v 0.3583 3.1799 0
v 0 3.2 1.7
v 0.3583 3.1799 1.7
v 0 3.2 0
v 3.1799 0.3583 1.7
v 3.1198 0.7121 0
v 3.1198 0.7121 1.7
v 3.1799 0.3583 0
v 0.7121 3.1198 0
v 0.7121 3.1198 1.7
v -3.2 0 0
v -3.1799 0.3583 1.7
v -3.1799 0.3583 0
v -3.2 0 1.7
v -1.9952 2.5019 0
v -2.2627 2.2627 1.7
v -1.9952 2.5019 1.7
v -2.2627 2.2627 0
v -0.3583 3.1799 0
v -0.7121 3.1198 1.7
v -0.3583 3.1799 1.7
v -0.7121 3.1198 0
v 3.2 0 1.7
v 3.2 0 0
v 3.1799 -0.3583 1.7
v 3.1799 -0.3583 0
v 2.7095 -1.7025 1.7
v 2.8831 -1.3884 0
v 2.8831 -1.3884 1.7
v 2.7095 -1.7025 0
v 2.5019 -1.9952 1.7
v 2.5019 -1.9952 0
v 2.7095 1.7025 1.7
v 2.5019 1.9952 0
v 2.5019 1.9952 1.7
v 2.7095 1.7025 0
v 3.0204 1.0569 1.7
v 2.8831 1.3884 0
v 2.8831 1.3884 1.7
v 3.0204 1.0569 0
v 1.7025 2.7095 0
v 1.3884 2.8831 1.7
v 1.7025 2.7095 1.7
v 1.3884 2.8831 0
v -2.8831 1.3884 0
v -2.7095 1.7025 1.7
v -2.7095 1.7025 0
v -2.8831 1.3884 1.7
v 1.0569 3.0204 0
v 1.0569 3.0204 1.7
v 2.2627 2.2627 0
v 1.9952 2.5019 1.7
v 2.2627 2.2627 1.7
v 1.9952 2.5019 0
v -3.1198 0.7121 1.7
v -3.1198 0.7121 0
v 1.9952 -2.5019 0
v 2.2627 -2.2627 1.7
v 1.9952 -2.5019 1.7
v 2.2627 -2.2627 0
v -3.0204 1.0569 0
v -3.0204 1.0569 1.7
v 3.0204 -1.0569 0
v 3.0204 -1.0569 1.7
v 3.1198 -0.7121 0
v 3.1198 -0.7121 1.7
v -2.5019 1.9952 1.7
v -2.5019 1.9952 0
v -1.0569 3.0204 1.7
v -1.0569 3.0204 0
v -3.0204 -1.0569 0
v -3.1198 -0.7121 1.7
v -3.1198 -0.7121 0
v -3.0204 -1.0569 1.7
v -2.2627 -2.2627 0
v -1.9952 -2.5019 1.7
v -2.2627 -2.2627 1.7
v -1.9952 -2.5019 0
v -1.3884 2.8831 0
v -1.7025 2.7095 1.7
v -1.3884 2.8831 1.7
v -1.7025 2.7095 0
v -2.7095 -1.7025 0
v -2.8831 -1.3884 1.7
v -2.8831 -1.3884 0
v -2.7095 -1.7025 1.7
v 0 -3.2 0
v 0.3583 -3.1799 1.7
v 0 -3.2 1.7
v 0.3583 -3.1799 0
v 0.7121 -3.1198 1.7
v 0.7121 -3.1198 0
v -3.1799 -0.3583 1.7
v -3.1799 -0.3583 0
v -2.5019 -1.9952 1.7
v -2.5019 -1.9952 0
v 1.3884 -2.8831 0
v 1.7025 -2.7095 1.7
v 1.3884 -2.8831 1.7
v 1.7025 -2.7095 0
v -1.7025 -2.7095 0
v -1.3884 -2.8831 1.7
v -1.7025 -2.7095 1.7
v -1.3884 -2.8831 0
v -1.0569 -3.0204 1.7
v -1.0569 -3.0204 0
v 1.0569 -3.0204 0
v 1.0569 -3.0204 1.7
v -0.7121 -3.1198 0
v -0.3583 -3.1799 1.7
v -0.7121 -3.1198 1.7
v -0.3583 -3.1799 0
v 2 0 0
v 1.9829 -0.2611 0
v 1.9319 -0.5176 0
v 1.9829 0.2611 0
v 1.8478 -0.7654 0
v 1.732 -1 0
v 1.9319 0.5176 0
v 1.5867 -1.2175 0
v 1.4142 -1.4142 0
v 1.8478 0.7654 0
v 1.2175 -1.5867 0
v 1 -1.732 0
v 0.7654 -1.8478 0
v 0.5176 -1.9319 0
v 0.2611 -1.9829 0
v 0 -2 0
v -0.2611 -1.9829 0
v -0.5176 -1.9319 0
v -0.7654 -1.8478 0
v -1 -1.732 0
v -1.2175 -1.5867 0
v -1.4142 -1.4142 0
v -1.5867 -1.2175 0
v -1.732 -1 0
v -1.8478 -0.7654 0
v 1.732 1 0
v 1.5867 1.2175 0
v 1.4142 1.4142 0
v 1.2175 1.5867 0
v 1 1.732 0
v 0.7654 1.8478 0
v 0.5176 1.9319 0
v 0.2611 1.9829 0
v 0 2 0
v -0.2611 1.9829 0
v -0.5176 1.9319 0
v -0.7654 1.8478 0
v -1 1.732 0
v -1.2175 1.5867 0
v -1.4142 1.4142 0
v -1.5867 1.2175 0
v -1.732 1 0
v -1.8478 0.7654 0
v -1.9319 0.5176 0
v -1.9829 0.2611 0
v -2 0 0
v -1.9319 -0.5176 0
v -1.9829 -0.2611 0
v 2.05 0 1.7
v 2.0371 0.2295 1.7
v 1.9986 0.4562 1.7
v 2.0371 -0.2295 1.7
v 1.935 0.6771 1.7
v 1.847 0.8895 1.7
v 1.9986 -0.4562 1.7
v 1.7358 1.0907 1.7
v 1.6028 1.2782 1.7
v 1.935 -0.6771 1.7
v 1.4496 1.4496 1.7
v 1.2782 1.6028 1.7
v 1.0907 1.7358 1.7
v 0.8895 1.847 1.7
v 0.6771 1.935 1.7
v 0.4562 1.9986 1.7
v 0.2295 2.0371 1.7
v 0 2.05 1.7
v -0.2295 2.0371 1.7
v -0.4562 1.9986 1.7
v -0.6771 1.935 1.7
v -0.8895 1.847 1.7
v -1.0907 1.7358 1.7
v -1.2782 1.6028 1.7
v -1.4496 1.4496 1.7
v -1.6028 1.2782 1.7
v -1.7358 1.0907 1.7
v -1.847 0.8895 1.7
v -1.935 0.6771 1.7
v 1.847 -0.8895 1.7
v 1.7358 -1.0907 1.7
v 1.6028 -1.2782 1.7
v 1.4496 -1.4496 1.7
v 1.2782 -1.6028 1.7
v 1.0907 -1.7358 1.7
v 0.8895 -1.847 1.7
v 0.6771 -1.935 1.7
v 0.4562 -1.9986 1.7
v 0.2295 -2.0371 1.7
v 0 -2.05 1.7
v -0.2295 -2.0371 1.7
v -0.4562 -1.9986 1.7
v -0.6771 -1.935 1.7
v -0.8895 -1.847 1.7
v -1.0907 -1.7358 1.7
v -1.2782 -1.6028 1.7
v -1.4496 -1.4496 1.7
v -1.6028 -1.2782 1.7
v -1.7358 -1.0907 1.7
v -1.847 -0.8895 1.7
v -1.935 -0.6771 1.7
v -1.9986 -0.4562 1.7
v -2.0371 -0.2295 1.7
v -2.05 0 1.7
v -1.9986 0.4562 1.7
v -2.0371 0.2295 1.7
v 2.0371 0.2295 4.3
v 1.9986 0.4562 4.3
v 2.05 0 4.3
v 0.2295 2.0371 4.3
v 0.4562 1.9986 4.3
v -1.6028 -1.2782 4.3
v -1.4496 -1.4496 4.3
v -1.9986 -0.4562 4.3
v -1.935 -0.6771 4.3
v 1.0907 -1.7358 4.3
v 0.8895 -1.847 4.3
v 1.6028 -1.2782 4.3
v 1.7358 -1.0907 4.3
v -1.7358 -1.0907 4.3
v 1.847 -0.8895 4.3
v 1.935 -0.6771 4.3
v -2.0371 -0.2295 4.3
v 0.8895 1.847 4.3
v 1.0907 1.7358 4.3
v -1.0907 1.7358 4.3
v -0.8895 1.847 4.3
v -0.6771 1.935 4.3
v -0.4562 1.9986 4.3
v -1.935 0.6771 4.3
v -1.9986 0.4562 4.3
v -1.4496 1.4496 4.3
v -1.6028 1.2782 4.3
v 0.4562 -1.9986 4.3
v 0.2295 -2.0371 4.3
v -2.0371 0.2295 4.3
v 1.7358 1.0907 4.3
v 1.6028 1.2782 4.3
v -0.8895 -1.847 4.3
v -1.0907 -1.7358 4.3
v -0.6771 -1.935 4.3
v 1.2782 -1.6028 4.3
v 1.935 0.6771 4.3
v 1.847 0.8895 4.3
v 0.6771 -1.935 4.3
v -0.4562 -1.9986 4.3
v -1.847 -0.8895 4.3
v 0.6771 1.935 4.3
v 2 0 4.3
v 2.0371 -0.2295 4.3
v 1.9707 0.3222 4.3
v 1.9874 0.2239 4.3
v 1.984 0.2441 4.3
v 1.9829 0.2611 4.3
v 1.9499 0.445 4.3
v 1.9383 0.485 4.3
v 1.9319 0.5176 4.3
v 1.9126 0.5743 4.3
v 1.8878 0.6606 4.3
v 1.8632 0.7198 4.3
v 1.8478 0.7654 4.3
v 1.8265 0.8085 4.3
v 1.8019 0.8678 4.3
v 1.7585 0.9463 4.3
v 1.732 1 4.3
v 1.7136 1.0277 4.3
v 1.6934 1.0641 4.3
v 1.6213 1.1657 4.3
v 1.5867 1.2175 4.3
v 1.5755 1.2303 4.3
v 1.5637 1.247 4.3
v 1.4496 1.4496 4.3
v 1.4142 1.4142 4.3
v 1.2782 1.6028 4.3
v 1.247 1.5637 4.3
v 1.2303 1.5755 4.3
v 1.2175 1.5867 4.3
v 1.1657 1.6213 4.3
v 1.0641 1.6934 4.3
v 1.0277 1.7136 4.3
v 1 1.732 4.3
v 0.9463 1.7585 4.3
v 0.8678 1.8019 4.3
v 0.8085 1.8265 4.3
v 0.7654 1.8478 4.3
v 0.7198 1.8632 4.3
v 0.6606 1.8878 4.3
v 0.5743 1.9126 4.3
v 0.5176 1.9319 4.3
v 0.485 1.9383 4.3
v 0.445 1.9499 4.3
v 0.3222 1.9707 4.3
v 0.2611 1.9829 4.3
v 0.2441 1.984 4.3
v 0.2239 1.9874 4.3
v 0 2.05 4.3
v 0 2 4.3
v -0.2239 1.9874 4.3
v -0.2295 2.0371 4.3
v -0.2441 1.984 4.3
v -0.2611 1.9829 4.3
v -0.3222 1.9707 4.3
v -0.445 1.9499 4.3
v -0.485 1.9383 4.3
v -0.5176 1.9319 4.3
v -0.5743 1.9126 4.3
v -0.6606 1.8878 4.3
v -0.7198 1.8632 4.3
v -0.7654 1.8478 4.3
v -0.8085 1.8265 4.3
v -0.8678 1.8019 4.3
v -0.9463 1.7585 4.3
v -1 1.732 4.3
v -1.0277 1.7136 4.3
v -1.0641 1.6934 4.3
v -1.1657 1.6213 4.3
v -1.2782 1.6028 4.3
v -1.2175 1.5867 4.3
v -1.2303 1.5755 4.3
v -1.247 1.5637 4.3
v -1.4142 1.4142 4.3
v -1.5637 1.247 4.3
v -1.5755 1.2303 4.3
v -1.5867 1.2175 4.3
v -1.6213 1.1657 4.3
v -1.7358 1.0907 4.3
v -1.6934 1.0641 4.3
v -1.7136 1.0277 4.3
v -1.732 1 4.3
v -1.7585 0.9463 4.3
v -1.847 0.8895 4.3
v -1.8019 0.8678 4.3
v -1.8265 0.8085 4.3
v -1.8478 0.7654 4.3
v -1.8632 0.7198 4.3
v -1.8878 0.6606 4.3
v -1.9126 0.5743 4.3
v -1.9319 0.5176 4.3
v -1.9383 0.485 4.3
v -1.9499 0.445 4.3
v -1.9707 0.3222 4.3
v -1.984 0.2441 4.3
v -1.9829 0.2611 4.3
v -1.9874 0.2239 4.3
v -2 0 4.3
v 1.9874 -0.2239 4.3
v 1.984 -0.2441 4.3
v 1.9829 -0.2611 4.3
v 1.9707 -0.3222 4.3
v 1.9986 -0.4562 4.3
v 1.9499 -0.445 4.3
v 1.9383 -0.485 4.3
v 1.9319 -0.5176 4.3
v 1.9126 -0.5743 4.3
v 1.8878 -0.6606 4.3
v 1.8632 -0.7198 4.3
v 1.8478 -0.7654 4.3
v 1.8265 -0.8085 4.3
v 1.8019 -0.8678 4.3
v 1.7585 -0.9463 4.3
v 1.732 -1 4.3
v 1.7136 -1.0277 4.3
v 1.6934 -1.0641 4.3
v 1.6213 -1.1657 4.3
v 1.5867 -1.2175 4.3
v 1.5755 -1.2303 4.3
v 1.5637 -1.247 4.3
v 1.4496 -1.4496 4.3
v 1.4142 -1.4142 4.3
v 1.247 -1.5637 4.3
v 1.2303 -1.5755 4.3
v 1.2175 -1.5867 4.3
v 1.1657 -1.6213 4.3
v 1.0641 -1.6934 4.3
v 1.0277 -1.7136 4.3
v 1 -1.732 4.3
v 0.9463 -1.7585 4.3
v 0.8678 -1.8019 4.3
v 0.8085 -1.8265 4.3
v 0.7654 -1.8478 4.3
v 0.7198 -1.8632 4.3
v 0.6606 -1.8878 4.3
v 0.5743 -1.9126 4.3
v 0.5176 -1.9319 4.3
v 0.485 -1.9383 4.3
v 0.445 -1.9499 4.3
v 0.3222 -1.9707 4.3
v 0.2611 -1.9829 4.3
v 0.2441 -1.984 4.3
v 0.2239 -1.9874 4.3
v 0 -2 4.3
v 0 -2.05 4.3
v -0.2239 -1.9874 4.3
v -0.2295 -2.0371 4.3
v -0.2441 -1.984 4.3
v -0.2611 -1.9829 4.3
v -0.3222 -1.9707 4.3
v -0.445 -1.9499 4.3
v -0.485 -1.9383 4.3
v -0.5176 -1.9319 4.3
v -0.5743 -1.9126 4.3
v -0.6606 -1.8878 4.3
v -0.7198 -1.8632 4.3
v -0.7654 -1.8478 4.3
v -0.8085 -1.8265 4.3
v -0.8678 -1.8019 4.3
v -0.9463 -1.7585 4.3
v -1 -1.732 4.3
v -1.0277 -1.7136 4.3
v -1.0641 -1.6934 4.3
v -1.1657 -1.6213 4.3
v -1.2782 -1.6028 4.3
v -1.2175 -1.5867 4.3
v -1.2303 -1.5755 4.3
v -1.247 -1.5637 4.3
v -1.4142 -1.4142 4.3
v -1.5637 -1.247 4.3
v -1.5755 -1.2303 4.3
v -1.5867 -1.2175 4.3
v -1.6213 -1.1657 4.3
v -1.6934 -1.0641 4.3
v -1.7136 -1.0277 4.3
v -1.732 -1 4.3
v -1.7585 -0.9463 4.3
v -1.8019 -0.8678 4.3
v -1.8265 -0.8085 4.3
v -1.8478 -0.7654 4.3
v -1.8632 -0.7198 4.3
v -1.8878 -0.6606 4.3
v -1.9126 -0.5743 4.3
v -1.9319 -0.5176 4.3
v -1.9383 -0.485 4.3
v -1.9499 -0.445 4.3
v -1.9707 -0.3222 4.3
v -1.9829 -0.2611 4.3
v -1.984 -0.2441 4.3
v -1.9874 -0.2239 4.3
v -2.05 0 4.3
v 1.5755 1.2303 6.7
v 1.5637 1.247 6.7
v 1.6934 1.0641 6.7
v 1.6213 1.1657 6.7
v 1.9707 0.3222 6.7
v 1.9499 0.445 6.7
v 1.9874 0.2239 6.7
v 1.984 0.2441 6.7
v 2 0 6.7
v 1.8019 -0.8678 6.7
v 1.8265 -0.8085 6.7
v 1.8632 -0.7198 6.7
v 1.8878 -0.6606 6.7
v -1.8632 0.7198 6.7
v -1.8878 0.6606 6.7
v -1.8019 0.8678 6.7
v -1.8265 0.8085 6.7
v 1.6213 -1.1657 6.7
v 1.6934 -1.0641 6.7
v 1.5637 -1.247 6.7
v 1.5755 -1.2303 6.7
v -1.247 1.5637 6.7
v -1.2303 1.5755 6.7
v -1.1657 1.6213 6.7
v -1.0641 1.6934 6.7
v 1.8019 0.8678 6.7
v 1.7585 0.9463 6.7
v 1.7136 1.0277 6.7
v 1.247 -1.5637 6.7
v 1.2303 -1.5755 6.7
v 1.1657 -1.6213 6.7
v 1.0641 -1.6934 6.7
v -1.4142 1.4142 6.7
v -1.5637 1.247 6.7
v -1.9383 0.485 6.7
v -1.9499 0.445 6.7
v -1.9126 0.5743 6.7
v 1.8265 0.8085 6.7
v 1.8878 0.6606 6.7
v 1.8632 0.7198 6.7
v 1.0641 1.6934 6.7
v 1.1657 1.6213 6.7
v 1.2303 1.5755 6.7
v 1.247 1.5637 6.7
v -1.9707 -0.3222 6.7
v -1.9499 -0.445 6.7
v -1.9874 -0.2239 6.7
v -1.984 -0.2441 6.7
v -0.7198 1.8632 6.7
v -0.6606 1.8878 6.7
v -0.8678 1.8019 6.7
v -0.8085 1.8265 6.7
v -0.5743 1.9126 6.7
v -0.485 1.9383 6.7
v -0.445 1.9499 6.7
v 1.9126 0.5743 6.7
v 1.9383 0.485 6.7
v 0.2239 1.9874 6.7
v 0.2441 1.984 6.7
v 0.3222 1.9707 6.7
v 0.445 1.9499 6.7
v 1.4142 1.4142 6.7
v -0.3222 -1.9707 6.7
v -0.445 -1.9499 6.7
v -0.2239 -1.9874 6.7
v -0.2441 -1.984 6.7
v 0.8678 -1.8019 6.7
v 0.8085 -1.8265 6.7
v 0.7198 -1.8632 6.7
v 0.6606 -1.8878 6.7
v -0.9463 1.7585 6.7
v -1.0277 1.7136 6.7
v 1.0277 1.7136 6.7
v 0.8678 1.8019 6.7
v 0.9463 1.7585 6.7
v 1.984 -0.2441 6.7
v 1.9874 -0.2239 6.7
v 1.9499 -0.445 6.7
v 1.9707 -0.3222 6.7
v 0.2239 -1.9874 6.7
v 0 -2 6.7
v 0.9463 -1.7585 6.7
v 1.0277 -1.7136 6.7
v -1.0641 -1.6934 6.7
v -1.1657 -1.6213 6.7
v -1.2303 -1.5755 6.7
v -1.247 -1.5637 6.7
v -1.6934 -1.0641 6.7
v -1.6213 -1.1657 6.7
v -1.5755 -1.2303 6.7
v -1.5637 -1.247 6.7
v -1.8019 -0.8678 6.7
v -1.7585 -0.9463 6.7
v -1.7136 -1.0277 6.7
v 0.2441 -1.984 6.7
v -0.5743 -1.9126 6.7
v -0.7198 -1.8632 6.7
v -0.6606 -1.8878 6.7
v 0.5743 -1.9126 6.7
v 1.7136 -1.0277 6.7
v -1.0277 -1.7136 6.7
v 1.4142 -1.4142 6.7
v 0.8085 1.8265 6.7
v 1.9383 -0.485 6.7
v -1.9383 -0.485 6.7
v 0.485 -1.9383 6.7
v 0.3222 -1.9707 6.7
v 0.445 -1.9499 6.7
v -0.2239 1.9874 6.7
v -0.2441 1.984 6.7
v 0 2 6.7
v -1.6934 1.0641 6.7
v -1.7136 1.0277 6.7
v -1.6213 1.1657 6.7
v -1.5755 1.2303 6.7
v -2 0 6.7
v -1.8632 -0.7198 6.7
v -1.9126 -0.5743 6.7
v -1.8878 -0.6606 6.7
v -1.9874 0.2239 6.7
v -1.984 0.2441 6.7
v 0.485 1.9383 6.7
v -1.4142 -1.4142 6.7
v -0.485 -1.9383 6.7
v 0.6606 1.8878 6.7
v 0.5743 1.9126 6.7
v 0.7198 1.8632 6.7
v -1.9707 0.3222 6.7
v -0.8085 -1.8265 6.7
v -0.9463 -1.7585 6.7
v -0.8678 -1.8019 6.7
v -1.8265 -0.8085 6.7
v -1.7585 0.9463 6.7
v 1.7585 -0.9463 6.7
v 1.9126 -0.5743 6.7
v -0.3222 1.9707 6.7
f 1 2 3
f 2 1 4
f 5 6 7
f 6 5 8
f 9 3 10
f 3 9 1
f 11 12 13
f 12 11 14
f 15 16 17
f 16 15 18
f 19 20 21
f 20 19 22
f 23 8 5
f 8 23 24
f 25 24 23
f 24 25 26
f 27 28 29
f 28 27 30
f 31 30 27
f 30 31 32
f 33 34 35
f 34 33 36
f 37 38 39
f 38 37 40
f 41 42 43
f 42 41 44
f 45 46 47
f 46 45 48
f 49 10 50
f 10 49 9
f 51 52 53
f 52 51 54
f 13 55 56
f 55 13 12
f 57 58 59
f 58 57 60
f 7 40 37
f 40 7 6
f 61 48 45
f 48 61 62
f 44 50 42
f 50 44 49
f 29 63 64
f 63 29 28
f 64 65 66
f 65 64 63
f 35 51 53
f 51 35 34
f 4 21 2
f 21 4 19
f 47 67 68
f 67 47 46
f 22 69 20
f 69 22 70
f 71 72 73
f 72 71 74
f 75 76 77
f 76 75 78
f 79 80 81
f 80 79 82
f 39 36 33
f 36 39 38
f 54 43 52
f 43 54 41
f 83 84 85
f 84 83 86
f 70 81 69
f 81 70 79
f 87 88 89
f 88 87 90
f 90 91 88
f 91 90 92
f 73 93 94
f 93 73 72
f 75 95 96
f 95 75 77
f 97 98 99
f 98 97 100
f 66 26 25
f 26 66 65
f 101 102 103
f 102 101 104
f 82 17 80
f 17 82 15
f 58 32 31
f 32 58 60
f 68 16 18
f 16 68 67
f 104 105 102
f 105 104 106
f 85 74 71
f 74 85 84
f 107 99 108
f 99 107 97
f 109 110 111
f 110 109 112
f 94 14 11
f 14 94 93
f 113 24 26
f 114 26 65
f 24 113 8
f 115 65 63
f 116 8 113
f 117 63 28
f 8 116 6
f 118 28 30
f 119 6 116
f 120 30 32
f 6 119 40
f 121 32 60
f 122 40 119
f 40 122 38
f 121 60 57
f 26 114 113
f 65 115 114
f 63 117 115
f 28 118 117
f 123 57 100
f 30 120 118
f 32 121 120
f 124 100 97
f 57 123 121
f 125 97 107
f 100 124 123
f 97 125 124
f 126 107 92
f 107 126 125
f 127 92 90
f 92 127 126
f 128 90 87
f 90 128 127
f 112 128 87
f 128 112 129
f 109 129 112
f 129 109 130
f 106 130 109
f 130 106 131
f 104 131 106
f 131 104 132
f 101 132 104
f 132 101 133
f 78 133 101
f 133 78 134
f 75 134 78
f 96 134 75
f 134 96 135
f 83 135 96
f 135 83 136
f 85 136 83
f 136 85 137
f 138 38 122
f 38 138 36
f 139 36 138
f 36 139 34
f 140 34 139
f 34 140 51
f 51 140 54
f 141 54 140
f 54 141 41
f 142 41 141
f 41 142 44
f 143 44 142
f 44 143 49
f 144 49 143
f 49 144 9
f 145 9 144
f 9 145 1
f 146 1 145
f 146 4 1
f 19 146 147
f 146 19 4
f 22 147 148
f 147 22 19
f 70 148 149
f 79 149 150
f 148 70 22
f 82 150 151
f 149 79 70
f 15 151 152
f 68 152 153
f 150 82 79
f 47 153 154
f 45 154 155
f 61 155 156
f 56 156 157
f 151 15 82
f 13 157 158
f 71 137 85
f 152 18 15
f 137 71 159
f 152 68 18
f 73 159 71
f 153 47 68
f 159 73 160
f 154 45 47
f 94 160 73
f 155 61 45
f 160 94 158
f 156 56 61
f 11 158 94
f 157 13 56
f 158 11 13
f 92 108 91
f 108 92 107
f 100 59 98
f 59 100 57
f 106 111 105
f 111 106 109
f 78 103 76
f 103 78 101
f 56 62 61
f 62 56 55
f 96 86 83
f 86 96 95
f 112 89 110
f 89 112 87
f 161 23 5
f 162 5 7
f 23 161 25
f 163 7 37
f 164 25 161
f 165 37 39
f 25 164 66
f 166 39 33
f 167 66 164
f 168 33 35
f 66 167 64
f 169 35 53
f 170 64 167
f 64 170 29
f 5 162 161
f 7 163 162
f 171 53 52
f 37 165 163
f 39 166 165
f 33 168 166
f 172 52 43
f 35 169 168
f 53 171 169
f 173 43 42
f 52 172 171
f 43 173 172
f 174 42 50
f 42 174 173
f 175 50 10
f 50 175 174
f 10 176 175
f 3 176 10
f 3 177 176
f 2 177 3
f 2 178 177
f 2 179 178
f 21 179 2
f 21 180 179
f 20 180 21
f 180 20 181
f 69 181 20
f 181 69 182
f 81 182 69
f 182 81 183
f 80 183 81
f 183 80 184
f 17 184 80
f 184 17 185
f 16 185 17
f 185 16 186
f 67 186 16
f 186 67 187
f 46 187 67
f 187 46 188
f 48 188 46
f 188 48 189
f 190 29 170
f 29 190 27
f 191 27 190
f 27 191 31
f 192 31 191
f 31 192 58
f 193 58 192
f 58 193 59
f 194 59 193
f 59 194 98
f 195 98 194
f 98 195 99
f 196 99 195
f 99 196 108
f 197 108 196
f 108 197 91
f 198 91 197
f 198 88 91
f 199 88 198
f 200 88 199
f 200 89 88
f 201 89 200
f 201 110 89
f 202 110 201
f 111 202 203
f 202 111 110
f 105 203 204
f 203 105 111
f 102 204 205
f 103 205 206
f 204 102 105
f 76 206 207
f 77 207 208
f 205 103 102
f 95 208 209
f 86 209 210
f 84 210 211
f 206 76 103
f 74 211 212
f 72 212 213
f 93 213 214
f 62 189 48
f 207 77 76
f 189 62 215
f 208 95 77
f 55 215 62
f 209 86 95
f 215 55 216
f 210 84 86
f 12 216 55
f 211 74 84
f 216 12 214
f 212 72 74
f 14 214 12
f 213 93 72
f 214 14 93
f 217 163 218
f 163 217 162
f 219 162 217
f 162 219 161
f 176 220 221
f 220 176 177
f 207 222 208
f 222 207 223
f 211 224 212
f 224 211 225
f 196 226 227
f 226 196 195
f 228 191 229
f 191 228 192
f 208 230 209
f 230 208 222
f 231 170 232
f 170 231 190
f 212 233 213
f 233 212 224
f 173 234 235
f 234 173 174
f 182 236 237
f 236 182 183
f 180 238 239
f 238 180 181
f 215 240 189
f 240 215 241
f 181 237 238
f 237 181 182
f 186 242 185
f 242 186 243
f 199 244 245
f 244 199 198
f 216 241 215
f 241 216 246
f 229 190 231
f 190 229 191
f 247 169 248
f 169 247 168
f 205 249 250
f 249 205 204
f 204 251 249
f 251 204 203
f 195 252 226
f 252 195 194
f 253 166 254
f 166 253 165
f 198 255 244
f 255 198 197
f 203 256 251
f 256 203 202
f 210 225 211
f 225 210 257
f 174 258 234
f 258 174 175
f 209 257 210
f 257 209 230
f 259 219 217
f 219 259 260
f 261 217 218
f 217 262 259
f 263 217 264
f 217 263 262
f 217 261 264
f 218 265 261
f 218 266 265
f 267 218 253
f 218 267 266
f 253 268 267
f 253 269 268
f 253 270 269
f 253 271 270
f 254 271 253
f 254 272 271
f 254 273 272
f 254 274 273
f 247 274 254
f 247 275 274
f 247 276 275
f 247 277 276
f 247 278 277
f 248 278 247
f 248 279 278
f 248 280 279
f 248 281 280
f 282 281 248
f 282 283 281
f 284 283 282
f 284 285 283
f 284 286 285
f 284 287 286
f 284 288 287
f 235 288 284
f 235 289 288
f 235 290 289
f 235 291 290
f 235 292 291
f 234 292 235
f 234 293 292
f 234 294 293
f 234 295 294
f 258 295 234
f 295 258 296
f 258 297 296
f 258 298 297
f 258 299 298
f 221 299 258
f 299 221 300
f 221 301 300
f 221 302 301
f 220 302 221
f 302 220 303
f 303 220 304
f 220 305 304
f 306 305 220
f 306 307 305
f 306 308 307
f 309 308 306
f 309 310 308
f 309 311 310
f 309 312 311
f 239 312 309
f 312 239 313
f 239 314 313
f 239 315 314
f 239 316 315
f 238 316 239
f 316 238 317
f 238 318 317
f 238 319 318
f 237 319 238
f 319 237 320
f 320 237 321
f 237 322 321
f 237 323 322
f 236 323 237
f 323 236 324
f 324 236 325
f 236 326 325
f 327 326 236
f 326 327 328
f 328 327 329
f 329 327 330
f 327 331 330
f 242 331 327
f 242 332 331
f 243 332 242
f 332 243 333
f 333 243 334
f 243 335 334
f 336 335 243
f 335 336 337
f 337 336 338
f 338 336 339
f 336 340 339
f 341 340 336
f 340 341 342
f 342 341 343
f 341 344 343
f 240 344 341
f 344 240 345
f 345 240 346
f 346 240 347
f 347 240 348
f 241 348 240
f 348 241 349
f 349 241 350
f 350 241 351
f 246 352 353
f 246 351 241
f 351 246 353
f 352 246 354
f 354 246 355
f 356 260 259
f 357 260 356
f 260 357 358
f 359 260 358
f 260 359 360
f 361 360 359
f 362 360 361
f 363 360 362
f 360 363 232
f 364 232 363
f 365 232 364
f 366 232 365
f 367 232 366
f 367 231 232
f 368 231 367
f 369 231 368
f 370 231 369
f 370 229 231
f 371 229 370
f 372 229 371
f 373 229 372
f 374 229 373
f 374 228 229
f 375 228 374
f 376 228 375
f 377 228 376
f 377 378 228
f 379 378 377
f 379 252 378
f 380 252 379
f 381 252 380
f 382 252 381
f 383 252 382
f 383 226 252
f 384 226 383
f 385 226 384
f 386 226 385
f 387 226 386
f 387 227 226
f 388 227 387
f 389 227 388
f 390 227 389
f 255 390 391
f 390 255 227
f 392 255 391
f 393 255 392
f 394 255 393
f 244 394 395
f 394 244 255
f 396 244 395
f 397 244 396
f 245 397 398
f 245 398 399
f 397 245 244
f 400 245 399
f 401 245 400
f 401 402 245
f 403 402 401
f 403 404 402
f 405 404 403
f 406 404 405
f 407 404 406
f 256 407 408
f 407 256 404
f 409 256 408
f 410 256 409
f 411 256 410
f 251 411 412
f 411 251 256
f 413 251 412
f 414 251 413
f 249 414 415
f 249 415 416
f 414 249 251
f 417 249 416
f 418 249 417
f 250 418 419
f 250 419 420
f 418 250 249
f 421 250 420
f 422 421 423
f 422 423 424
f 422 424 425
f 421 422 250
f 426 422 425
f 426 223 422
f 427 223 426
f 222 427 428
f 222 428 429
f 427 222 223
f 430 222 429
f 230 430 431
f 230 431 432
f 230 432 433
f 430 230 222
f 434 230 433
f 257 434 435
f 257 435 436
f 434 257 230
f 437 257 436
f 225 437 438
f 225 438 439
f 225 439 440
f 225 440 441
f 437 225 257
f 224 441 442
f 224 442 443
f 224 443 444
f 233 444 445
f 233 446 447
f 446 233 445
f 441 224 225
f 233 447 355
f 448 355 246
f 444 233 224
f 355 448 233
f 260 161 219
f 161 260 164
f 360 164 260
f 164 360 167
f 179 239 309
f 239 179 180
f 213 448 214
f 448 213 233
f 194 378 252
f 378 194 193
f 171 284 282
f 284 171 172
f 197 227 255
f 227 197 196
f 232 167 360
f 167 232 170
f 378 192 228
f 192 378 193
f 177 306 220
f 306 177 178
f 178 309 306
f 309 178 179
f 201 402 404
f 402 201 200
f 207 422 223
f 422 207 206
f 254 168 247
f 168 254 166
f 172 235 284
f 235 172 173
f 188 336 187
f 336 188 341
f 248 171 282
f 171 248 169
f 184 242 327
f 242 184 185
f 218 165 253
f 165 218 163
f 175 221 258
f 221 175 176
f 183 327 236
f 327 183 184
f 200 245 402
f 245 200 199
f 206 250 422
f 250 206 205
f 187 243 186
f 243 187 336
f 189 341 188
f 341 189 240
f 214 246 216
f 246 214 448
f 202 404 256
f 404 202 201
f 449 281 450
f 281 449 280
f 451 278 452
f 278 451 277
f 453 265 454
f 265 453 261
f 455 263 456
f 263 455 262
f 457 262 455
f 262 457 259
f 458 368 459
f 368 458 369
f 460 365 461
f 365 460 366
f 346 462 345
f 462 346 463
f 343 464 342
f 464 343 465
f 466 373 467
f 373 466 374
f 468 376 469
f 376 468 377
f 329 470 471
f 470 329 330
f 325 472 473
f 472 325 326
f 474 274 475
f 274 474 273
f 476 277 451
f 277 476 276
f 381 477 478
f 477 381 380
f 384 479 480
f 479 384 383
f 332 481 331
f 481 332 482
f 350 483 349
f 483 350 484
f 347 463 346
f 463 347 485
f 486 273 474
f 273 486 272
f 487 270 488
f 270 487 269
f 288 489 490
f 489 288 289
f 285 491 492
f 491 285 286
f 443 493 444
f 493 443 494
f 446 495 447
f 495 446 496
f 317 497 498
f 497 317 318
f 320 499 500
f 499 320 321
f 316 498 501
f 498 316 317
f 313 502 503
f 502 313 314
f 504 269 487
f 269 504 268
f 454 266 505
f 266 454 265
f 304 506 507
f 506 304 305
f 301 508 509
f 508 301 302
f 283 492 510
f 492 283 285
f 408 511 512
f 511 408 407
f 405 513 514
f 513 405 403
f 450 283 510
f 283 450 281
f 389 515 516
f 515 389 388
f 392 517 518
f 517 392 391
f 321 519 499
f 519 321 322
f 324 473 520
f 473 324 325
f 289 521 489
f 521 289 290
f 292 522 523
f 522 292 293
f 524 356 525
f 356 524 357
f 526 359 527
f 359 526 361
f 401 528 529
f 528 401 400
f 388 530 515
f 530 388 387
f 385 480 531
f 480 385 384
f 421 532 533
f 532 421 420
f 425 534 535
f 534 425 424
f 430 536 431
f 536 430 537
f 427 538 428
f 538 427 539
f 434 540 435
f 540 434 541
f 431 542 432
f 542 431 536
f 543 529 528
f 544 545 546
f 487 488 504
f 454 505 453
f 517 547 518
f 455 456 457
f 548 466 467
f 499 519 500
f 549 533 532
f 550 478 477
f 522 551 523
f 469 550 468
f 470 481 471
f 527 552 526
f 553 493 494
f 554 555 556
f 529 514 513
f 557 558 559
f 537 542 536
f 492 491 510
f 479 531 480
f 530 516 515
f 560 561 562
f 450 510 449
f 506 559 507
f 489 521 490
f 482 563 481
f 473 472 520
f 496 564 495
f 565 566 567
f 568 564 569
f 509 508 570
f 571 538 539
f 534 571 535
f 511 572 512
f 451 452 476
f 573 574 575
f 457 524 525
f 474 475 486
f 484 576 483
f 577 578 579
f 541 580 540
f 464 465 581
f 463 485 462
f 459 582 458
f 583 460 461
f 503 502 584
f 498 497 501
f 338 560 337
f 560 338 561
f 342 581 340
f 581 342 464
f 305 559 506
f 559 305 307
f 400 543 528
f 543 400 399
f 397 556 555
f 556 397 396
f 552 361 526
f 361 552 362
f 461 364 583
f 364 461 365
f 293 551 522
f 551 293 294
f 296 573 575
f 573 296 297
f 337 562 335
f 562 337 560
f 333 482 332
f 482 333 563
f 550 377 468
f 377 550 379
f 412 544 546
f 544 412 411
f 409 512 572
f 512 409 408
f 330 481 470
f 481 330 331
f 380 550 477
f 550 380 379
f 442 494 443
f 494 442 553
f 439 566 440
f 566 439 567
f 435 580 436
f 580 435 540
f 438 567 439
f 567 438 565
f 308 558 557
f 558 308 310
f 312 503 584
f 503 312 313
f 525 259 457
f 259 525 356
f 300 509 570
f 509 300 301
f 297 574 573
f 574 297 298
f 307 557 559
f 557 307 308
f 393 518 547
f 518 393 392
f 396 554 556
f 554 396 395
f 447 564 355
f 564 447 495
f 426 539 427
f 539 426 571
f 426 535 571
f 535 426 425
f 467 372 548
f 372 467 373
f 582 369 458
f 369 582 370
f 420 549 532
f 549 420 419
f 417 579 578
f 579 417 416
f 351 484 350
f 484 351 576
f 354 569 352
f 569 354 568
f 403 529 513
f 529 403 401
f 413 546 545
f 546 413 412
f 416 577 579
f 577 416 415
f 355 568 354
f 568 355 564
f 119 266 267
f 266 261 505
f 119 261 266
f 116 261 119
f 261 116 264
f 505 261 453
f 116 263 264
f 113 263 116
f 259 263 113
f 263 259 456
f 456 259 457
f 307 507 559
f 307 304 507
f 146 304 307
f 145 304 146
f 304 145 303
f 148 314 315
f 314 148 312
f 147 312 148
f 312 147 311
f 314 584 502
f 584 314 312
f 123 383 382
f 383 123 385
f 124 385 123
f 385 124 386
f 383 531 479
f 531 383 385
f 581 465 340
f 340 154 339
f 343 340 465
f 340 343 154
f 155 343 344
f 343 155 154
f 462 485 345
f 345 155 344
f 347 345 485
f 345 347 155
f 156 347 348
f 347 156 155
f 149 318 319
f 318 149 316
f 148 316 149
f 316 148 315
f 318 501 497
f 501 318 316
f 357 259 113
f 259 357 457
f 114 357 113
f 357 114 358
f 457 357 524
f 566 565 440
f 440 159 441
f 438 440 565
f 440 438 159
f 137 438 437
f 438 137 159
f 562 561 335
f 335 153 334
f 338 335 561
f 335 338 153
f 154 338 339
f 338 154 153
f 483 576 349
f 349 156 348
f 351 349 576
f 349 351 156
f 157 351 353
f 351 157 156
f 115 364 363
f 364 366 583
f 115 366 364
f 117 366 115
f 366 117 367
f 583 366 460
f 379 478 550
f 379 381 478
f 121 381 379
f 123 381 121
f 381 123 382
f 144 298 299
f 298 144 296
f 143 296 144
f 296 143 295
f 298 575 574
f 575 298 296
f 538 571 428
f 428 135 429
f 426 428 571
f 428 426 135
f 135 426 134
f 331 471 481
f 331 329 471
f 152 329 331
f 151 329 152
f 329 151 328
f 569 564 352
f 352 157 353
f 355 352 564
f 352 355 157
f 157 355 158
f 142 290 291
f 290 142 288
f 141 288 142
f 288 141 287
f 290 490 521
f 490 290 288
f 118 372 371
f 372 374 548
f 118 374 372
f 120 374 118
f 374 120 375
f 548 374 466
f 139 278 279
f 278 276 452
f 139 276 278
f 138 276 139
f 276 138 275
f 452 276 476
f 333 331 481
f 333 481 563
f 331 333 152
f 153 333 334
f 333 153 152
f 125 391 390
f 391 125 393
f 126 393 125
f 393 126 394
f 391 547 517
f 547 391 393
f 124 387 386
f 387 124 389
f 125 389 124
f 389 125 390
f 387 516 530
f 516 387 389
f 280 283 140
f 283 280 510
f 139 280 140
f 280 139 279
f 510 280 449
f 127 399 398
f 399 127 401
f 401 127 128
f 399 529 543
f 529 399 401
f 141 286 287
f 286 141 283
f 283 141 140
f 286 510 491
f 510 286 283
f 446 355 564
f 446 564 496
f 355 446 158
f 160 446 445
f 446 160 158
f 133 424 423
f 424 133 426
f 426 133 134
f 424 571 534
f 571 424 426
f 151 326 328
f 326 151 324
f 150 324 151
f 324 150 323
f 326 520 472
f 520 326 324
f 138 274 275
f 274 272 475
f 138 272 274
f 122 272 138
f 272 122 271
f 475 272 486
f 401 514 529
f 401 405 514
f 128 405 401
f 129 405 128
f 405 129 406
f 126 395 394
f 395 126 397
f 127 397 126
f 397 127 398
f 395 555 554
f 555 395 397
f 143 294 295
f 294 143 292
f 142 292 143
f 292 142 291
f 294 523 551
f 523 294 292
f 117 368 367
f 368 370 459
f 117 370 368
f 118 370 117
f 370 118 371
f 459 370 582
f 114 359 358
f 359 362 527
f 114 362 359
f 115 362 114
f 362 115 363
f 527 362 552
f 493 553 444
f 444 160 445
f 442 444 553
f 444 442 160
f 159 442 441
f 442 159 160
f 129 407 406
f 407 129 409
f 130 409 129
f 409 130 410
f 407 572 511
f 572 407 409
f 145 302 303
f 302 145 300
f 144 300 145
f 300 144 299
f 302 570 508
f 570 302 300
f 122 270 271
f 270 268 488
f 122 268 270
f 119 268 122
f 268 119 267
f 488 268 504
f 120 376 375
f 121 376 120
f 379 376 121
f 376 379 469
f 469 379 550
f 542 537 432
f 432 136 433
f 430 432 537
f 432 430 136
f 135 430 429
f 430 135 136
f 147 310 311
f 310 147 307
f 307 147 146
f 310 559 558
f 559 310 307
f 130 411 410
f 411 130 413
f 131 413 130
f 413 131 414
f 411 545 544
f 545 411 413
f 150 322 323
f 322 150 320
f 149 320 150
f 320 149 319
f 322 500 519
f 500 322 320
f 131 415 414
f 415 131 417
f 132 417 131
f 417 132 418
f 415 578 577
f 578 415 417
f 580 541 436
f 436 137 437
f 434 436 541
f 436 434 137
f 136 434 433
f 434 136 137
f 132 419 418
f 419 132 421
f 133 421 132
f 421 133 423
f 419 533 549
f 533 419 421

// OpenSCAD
// part_id: jup10
// name: Jupiter axle spacer hub
// source_drawing_ids: DRW-012
// units: mm
// revision: 0.1
// SPDX-License-Identifier: MIT

module part_jup10(
    base_d = 6.4,
    body_d = 4.1,
    top_d = 4.0,
    total_h = 6.7,
    base_h = 1.7,
    body_h = 2.6,
    top_h = 2.4,
    center_d = 4.0
) {
    difference() {
        union() {
            cylinder(d = base_d, h = base_h, center = false, $fn = 56);
            translate([0, 0, base_h]) cylinder(d = body_d, h = body_h, center = false, $fn = 56);
            translate([0, 0, base_h + body_h]) cylinder(d = top_d, h = top_h, center = false, $fn = 56);
        }
        translate([0, 0, -0.05]) cylinder(d = center_d, h = total_h + 0.1, center = false, $fn = 48);
    }
}

// ---- "main guard" ----
// Default to previewing when opened directly:
if (is_undef(__LIB_MODE__)) {
    part_jup10();
}
